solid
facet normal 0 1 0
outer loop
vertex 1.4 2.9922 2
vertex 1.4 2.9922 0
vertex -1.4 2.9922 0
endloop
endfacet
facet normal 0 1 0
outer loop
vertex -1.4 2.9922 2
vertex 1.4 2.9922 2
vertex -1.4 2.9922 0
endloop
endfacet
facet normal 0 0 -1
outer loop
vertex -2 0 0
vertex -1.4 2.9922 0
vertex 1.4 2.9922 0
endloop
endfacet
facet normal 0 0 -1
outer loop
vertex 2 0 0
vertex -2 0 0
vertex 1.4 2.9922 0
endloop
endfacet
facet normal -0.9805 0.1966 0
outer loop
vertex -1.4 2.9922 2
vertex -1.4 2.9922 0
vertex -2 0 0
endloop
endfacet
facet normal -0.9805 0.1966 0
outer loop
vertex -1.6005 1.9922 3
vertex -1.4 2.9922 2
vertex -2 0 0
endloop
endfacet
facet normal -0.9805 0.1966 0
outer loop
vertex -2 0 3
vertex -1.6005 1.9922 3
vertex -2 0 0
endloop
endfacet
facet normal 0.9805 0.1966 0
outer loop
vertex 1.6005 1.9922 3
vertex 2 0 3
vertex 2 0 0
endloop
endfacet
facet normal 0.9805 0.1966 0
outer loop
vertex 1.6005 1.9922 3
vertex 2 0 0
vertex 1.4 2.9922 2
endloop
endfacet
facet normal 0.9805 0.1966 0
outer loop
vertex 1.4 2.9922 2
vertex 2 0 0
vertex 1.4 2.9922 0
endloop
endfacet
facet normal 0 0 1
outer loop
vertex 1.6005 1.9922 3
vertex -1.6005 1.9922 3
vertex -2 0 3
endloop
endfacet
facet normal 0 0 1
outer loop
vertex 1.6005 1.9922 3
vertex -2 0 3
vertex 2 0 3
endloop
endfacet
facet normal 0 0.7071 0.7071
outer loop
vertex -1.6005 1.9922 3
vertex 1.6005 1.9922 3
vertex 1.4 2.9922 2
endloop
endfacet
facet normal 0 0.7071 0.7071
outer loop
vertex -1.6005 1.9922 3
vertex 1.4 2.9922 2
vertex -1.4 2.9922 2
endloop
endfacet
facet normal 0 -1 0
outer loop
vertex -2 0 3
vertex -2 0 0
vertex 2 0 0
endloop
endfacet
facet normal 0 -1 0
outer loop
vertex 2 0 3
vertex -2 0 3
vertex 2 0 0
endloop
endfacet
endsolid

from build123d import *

# Parameters (mm, degrees)
PAD_DEPTH    = 3
CHAMFER_SIZE = 1


with BuildPart() as part:
    # Sketch → Pad (new body)
    with BuildSketch(Plane.XY):
        Polygon((0, 0), (2, 0), (1.4, 2.9922), (0, 2.9922), (-1.4, 2.9922), (-2, 0), align=None)
    extrude(amount=PAD_DEPTH)

    # Chamfer
    chamfer_edges = [part.edges().sort_by_distance(p)[0] for p in [
        (-0.7, 2.9922, 3),
        (0.7, 2.9922, 3),
    ]]
    chamfer(chamfer_edges, length=CHAMFER_SIZE)


solid = part.part
